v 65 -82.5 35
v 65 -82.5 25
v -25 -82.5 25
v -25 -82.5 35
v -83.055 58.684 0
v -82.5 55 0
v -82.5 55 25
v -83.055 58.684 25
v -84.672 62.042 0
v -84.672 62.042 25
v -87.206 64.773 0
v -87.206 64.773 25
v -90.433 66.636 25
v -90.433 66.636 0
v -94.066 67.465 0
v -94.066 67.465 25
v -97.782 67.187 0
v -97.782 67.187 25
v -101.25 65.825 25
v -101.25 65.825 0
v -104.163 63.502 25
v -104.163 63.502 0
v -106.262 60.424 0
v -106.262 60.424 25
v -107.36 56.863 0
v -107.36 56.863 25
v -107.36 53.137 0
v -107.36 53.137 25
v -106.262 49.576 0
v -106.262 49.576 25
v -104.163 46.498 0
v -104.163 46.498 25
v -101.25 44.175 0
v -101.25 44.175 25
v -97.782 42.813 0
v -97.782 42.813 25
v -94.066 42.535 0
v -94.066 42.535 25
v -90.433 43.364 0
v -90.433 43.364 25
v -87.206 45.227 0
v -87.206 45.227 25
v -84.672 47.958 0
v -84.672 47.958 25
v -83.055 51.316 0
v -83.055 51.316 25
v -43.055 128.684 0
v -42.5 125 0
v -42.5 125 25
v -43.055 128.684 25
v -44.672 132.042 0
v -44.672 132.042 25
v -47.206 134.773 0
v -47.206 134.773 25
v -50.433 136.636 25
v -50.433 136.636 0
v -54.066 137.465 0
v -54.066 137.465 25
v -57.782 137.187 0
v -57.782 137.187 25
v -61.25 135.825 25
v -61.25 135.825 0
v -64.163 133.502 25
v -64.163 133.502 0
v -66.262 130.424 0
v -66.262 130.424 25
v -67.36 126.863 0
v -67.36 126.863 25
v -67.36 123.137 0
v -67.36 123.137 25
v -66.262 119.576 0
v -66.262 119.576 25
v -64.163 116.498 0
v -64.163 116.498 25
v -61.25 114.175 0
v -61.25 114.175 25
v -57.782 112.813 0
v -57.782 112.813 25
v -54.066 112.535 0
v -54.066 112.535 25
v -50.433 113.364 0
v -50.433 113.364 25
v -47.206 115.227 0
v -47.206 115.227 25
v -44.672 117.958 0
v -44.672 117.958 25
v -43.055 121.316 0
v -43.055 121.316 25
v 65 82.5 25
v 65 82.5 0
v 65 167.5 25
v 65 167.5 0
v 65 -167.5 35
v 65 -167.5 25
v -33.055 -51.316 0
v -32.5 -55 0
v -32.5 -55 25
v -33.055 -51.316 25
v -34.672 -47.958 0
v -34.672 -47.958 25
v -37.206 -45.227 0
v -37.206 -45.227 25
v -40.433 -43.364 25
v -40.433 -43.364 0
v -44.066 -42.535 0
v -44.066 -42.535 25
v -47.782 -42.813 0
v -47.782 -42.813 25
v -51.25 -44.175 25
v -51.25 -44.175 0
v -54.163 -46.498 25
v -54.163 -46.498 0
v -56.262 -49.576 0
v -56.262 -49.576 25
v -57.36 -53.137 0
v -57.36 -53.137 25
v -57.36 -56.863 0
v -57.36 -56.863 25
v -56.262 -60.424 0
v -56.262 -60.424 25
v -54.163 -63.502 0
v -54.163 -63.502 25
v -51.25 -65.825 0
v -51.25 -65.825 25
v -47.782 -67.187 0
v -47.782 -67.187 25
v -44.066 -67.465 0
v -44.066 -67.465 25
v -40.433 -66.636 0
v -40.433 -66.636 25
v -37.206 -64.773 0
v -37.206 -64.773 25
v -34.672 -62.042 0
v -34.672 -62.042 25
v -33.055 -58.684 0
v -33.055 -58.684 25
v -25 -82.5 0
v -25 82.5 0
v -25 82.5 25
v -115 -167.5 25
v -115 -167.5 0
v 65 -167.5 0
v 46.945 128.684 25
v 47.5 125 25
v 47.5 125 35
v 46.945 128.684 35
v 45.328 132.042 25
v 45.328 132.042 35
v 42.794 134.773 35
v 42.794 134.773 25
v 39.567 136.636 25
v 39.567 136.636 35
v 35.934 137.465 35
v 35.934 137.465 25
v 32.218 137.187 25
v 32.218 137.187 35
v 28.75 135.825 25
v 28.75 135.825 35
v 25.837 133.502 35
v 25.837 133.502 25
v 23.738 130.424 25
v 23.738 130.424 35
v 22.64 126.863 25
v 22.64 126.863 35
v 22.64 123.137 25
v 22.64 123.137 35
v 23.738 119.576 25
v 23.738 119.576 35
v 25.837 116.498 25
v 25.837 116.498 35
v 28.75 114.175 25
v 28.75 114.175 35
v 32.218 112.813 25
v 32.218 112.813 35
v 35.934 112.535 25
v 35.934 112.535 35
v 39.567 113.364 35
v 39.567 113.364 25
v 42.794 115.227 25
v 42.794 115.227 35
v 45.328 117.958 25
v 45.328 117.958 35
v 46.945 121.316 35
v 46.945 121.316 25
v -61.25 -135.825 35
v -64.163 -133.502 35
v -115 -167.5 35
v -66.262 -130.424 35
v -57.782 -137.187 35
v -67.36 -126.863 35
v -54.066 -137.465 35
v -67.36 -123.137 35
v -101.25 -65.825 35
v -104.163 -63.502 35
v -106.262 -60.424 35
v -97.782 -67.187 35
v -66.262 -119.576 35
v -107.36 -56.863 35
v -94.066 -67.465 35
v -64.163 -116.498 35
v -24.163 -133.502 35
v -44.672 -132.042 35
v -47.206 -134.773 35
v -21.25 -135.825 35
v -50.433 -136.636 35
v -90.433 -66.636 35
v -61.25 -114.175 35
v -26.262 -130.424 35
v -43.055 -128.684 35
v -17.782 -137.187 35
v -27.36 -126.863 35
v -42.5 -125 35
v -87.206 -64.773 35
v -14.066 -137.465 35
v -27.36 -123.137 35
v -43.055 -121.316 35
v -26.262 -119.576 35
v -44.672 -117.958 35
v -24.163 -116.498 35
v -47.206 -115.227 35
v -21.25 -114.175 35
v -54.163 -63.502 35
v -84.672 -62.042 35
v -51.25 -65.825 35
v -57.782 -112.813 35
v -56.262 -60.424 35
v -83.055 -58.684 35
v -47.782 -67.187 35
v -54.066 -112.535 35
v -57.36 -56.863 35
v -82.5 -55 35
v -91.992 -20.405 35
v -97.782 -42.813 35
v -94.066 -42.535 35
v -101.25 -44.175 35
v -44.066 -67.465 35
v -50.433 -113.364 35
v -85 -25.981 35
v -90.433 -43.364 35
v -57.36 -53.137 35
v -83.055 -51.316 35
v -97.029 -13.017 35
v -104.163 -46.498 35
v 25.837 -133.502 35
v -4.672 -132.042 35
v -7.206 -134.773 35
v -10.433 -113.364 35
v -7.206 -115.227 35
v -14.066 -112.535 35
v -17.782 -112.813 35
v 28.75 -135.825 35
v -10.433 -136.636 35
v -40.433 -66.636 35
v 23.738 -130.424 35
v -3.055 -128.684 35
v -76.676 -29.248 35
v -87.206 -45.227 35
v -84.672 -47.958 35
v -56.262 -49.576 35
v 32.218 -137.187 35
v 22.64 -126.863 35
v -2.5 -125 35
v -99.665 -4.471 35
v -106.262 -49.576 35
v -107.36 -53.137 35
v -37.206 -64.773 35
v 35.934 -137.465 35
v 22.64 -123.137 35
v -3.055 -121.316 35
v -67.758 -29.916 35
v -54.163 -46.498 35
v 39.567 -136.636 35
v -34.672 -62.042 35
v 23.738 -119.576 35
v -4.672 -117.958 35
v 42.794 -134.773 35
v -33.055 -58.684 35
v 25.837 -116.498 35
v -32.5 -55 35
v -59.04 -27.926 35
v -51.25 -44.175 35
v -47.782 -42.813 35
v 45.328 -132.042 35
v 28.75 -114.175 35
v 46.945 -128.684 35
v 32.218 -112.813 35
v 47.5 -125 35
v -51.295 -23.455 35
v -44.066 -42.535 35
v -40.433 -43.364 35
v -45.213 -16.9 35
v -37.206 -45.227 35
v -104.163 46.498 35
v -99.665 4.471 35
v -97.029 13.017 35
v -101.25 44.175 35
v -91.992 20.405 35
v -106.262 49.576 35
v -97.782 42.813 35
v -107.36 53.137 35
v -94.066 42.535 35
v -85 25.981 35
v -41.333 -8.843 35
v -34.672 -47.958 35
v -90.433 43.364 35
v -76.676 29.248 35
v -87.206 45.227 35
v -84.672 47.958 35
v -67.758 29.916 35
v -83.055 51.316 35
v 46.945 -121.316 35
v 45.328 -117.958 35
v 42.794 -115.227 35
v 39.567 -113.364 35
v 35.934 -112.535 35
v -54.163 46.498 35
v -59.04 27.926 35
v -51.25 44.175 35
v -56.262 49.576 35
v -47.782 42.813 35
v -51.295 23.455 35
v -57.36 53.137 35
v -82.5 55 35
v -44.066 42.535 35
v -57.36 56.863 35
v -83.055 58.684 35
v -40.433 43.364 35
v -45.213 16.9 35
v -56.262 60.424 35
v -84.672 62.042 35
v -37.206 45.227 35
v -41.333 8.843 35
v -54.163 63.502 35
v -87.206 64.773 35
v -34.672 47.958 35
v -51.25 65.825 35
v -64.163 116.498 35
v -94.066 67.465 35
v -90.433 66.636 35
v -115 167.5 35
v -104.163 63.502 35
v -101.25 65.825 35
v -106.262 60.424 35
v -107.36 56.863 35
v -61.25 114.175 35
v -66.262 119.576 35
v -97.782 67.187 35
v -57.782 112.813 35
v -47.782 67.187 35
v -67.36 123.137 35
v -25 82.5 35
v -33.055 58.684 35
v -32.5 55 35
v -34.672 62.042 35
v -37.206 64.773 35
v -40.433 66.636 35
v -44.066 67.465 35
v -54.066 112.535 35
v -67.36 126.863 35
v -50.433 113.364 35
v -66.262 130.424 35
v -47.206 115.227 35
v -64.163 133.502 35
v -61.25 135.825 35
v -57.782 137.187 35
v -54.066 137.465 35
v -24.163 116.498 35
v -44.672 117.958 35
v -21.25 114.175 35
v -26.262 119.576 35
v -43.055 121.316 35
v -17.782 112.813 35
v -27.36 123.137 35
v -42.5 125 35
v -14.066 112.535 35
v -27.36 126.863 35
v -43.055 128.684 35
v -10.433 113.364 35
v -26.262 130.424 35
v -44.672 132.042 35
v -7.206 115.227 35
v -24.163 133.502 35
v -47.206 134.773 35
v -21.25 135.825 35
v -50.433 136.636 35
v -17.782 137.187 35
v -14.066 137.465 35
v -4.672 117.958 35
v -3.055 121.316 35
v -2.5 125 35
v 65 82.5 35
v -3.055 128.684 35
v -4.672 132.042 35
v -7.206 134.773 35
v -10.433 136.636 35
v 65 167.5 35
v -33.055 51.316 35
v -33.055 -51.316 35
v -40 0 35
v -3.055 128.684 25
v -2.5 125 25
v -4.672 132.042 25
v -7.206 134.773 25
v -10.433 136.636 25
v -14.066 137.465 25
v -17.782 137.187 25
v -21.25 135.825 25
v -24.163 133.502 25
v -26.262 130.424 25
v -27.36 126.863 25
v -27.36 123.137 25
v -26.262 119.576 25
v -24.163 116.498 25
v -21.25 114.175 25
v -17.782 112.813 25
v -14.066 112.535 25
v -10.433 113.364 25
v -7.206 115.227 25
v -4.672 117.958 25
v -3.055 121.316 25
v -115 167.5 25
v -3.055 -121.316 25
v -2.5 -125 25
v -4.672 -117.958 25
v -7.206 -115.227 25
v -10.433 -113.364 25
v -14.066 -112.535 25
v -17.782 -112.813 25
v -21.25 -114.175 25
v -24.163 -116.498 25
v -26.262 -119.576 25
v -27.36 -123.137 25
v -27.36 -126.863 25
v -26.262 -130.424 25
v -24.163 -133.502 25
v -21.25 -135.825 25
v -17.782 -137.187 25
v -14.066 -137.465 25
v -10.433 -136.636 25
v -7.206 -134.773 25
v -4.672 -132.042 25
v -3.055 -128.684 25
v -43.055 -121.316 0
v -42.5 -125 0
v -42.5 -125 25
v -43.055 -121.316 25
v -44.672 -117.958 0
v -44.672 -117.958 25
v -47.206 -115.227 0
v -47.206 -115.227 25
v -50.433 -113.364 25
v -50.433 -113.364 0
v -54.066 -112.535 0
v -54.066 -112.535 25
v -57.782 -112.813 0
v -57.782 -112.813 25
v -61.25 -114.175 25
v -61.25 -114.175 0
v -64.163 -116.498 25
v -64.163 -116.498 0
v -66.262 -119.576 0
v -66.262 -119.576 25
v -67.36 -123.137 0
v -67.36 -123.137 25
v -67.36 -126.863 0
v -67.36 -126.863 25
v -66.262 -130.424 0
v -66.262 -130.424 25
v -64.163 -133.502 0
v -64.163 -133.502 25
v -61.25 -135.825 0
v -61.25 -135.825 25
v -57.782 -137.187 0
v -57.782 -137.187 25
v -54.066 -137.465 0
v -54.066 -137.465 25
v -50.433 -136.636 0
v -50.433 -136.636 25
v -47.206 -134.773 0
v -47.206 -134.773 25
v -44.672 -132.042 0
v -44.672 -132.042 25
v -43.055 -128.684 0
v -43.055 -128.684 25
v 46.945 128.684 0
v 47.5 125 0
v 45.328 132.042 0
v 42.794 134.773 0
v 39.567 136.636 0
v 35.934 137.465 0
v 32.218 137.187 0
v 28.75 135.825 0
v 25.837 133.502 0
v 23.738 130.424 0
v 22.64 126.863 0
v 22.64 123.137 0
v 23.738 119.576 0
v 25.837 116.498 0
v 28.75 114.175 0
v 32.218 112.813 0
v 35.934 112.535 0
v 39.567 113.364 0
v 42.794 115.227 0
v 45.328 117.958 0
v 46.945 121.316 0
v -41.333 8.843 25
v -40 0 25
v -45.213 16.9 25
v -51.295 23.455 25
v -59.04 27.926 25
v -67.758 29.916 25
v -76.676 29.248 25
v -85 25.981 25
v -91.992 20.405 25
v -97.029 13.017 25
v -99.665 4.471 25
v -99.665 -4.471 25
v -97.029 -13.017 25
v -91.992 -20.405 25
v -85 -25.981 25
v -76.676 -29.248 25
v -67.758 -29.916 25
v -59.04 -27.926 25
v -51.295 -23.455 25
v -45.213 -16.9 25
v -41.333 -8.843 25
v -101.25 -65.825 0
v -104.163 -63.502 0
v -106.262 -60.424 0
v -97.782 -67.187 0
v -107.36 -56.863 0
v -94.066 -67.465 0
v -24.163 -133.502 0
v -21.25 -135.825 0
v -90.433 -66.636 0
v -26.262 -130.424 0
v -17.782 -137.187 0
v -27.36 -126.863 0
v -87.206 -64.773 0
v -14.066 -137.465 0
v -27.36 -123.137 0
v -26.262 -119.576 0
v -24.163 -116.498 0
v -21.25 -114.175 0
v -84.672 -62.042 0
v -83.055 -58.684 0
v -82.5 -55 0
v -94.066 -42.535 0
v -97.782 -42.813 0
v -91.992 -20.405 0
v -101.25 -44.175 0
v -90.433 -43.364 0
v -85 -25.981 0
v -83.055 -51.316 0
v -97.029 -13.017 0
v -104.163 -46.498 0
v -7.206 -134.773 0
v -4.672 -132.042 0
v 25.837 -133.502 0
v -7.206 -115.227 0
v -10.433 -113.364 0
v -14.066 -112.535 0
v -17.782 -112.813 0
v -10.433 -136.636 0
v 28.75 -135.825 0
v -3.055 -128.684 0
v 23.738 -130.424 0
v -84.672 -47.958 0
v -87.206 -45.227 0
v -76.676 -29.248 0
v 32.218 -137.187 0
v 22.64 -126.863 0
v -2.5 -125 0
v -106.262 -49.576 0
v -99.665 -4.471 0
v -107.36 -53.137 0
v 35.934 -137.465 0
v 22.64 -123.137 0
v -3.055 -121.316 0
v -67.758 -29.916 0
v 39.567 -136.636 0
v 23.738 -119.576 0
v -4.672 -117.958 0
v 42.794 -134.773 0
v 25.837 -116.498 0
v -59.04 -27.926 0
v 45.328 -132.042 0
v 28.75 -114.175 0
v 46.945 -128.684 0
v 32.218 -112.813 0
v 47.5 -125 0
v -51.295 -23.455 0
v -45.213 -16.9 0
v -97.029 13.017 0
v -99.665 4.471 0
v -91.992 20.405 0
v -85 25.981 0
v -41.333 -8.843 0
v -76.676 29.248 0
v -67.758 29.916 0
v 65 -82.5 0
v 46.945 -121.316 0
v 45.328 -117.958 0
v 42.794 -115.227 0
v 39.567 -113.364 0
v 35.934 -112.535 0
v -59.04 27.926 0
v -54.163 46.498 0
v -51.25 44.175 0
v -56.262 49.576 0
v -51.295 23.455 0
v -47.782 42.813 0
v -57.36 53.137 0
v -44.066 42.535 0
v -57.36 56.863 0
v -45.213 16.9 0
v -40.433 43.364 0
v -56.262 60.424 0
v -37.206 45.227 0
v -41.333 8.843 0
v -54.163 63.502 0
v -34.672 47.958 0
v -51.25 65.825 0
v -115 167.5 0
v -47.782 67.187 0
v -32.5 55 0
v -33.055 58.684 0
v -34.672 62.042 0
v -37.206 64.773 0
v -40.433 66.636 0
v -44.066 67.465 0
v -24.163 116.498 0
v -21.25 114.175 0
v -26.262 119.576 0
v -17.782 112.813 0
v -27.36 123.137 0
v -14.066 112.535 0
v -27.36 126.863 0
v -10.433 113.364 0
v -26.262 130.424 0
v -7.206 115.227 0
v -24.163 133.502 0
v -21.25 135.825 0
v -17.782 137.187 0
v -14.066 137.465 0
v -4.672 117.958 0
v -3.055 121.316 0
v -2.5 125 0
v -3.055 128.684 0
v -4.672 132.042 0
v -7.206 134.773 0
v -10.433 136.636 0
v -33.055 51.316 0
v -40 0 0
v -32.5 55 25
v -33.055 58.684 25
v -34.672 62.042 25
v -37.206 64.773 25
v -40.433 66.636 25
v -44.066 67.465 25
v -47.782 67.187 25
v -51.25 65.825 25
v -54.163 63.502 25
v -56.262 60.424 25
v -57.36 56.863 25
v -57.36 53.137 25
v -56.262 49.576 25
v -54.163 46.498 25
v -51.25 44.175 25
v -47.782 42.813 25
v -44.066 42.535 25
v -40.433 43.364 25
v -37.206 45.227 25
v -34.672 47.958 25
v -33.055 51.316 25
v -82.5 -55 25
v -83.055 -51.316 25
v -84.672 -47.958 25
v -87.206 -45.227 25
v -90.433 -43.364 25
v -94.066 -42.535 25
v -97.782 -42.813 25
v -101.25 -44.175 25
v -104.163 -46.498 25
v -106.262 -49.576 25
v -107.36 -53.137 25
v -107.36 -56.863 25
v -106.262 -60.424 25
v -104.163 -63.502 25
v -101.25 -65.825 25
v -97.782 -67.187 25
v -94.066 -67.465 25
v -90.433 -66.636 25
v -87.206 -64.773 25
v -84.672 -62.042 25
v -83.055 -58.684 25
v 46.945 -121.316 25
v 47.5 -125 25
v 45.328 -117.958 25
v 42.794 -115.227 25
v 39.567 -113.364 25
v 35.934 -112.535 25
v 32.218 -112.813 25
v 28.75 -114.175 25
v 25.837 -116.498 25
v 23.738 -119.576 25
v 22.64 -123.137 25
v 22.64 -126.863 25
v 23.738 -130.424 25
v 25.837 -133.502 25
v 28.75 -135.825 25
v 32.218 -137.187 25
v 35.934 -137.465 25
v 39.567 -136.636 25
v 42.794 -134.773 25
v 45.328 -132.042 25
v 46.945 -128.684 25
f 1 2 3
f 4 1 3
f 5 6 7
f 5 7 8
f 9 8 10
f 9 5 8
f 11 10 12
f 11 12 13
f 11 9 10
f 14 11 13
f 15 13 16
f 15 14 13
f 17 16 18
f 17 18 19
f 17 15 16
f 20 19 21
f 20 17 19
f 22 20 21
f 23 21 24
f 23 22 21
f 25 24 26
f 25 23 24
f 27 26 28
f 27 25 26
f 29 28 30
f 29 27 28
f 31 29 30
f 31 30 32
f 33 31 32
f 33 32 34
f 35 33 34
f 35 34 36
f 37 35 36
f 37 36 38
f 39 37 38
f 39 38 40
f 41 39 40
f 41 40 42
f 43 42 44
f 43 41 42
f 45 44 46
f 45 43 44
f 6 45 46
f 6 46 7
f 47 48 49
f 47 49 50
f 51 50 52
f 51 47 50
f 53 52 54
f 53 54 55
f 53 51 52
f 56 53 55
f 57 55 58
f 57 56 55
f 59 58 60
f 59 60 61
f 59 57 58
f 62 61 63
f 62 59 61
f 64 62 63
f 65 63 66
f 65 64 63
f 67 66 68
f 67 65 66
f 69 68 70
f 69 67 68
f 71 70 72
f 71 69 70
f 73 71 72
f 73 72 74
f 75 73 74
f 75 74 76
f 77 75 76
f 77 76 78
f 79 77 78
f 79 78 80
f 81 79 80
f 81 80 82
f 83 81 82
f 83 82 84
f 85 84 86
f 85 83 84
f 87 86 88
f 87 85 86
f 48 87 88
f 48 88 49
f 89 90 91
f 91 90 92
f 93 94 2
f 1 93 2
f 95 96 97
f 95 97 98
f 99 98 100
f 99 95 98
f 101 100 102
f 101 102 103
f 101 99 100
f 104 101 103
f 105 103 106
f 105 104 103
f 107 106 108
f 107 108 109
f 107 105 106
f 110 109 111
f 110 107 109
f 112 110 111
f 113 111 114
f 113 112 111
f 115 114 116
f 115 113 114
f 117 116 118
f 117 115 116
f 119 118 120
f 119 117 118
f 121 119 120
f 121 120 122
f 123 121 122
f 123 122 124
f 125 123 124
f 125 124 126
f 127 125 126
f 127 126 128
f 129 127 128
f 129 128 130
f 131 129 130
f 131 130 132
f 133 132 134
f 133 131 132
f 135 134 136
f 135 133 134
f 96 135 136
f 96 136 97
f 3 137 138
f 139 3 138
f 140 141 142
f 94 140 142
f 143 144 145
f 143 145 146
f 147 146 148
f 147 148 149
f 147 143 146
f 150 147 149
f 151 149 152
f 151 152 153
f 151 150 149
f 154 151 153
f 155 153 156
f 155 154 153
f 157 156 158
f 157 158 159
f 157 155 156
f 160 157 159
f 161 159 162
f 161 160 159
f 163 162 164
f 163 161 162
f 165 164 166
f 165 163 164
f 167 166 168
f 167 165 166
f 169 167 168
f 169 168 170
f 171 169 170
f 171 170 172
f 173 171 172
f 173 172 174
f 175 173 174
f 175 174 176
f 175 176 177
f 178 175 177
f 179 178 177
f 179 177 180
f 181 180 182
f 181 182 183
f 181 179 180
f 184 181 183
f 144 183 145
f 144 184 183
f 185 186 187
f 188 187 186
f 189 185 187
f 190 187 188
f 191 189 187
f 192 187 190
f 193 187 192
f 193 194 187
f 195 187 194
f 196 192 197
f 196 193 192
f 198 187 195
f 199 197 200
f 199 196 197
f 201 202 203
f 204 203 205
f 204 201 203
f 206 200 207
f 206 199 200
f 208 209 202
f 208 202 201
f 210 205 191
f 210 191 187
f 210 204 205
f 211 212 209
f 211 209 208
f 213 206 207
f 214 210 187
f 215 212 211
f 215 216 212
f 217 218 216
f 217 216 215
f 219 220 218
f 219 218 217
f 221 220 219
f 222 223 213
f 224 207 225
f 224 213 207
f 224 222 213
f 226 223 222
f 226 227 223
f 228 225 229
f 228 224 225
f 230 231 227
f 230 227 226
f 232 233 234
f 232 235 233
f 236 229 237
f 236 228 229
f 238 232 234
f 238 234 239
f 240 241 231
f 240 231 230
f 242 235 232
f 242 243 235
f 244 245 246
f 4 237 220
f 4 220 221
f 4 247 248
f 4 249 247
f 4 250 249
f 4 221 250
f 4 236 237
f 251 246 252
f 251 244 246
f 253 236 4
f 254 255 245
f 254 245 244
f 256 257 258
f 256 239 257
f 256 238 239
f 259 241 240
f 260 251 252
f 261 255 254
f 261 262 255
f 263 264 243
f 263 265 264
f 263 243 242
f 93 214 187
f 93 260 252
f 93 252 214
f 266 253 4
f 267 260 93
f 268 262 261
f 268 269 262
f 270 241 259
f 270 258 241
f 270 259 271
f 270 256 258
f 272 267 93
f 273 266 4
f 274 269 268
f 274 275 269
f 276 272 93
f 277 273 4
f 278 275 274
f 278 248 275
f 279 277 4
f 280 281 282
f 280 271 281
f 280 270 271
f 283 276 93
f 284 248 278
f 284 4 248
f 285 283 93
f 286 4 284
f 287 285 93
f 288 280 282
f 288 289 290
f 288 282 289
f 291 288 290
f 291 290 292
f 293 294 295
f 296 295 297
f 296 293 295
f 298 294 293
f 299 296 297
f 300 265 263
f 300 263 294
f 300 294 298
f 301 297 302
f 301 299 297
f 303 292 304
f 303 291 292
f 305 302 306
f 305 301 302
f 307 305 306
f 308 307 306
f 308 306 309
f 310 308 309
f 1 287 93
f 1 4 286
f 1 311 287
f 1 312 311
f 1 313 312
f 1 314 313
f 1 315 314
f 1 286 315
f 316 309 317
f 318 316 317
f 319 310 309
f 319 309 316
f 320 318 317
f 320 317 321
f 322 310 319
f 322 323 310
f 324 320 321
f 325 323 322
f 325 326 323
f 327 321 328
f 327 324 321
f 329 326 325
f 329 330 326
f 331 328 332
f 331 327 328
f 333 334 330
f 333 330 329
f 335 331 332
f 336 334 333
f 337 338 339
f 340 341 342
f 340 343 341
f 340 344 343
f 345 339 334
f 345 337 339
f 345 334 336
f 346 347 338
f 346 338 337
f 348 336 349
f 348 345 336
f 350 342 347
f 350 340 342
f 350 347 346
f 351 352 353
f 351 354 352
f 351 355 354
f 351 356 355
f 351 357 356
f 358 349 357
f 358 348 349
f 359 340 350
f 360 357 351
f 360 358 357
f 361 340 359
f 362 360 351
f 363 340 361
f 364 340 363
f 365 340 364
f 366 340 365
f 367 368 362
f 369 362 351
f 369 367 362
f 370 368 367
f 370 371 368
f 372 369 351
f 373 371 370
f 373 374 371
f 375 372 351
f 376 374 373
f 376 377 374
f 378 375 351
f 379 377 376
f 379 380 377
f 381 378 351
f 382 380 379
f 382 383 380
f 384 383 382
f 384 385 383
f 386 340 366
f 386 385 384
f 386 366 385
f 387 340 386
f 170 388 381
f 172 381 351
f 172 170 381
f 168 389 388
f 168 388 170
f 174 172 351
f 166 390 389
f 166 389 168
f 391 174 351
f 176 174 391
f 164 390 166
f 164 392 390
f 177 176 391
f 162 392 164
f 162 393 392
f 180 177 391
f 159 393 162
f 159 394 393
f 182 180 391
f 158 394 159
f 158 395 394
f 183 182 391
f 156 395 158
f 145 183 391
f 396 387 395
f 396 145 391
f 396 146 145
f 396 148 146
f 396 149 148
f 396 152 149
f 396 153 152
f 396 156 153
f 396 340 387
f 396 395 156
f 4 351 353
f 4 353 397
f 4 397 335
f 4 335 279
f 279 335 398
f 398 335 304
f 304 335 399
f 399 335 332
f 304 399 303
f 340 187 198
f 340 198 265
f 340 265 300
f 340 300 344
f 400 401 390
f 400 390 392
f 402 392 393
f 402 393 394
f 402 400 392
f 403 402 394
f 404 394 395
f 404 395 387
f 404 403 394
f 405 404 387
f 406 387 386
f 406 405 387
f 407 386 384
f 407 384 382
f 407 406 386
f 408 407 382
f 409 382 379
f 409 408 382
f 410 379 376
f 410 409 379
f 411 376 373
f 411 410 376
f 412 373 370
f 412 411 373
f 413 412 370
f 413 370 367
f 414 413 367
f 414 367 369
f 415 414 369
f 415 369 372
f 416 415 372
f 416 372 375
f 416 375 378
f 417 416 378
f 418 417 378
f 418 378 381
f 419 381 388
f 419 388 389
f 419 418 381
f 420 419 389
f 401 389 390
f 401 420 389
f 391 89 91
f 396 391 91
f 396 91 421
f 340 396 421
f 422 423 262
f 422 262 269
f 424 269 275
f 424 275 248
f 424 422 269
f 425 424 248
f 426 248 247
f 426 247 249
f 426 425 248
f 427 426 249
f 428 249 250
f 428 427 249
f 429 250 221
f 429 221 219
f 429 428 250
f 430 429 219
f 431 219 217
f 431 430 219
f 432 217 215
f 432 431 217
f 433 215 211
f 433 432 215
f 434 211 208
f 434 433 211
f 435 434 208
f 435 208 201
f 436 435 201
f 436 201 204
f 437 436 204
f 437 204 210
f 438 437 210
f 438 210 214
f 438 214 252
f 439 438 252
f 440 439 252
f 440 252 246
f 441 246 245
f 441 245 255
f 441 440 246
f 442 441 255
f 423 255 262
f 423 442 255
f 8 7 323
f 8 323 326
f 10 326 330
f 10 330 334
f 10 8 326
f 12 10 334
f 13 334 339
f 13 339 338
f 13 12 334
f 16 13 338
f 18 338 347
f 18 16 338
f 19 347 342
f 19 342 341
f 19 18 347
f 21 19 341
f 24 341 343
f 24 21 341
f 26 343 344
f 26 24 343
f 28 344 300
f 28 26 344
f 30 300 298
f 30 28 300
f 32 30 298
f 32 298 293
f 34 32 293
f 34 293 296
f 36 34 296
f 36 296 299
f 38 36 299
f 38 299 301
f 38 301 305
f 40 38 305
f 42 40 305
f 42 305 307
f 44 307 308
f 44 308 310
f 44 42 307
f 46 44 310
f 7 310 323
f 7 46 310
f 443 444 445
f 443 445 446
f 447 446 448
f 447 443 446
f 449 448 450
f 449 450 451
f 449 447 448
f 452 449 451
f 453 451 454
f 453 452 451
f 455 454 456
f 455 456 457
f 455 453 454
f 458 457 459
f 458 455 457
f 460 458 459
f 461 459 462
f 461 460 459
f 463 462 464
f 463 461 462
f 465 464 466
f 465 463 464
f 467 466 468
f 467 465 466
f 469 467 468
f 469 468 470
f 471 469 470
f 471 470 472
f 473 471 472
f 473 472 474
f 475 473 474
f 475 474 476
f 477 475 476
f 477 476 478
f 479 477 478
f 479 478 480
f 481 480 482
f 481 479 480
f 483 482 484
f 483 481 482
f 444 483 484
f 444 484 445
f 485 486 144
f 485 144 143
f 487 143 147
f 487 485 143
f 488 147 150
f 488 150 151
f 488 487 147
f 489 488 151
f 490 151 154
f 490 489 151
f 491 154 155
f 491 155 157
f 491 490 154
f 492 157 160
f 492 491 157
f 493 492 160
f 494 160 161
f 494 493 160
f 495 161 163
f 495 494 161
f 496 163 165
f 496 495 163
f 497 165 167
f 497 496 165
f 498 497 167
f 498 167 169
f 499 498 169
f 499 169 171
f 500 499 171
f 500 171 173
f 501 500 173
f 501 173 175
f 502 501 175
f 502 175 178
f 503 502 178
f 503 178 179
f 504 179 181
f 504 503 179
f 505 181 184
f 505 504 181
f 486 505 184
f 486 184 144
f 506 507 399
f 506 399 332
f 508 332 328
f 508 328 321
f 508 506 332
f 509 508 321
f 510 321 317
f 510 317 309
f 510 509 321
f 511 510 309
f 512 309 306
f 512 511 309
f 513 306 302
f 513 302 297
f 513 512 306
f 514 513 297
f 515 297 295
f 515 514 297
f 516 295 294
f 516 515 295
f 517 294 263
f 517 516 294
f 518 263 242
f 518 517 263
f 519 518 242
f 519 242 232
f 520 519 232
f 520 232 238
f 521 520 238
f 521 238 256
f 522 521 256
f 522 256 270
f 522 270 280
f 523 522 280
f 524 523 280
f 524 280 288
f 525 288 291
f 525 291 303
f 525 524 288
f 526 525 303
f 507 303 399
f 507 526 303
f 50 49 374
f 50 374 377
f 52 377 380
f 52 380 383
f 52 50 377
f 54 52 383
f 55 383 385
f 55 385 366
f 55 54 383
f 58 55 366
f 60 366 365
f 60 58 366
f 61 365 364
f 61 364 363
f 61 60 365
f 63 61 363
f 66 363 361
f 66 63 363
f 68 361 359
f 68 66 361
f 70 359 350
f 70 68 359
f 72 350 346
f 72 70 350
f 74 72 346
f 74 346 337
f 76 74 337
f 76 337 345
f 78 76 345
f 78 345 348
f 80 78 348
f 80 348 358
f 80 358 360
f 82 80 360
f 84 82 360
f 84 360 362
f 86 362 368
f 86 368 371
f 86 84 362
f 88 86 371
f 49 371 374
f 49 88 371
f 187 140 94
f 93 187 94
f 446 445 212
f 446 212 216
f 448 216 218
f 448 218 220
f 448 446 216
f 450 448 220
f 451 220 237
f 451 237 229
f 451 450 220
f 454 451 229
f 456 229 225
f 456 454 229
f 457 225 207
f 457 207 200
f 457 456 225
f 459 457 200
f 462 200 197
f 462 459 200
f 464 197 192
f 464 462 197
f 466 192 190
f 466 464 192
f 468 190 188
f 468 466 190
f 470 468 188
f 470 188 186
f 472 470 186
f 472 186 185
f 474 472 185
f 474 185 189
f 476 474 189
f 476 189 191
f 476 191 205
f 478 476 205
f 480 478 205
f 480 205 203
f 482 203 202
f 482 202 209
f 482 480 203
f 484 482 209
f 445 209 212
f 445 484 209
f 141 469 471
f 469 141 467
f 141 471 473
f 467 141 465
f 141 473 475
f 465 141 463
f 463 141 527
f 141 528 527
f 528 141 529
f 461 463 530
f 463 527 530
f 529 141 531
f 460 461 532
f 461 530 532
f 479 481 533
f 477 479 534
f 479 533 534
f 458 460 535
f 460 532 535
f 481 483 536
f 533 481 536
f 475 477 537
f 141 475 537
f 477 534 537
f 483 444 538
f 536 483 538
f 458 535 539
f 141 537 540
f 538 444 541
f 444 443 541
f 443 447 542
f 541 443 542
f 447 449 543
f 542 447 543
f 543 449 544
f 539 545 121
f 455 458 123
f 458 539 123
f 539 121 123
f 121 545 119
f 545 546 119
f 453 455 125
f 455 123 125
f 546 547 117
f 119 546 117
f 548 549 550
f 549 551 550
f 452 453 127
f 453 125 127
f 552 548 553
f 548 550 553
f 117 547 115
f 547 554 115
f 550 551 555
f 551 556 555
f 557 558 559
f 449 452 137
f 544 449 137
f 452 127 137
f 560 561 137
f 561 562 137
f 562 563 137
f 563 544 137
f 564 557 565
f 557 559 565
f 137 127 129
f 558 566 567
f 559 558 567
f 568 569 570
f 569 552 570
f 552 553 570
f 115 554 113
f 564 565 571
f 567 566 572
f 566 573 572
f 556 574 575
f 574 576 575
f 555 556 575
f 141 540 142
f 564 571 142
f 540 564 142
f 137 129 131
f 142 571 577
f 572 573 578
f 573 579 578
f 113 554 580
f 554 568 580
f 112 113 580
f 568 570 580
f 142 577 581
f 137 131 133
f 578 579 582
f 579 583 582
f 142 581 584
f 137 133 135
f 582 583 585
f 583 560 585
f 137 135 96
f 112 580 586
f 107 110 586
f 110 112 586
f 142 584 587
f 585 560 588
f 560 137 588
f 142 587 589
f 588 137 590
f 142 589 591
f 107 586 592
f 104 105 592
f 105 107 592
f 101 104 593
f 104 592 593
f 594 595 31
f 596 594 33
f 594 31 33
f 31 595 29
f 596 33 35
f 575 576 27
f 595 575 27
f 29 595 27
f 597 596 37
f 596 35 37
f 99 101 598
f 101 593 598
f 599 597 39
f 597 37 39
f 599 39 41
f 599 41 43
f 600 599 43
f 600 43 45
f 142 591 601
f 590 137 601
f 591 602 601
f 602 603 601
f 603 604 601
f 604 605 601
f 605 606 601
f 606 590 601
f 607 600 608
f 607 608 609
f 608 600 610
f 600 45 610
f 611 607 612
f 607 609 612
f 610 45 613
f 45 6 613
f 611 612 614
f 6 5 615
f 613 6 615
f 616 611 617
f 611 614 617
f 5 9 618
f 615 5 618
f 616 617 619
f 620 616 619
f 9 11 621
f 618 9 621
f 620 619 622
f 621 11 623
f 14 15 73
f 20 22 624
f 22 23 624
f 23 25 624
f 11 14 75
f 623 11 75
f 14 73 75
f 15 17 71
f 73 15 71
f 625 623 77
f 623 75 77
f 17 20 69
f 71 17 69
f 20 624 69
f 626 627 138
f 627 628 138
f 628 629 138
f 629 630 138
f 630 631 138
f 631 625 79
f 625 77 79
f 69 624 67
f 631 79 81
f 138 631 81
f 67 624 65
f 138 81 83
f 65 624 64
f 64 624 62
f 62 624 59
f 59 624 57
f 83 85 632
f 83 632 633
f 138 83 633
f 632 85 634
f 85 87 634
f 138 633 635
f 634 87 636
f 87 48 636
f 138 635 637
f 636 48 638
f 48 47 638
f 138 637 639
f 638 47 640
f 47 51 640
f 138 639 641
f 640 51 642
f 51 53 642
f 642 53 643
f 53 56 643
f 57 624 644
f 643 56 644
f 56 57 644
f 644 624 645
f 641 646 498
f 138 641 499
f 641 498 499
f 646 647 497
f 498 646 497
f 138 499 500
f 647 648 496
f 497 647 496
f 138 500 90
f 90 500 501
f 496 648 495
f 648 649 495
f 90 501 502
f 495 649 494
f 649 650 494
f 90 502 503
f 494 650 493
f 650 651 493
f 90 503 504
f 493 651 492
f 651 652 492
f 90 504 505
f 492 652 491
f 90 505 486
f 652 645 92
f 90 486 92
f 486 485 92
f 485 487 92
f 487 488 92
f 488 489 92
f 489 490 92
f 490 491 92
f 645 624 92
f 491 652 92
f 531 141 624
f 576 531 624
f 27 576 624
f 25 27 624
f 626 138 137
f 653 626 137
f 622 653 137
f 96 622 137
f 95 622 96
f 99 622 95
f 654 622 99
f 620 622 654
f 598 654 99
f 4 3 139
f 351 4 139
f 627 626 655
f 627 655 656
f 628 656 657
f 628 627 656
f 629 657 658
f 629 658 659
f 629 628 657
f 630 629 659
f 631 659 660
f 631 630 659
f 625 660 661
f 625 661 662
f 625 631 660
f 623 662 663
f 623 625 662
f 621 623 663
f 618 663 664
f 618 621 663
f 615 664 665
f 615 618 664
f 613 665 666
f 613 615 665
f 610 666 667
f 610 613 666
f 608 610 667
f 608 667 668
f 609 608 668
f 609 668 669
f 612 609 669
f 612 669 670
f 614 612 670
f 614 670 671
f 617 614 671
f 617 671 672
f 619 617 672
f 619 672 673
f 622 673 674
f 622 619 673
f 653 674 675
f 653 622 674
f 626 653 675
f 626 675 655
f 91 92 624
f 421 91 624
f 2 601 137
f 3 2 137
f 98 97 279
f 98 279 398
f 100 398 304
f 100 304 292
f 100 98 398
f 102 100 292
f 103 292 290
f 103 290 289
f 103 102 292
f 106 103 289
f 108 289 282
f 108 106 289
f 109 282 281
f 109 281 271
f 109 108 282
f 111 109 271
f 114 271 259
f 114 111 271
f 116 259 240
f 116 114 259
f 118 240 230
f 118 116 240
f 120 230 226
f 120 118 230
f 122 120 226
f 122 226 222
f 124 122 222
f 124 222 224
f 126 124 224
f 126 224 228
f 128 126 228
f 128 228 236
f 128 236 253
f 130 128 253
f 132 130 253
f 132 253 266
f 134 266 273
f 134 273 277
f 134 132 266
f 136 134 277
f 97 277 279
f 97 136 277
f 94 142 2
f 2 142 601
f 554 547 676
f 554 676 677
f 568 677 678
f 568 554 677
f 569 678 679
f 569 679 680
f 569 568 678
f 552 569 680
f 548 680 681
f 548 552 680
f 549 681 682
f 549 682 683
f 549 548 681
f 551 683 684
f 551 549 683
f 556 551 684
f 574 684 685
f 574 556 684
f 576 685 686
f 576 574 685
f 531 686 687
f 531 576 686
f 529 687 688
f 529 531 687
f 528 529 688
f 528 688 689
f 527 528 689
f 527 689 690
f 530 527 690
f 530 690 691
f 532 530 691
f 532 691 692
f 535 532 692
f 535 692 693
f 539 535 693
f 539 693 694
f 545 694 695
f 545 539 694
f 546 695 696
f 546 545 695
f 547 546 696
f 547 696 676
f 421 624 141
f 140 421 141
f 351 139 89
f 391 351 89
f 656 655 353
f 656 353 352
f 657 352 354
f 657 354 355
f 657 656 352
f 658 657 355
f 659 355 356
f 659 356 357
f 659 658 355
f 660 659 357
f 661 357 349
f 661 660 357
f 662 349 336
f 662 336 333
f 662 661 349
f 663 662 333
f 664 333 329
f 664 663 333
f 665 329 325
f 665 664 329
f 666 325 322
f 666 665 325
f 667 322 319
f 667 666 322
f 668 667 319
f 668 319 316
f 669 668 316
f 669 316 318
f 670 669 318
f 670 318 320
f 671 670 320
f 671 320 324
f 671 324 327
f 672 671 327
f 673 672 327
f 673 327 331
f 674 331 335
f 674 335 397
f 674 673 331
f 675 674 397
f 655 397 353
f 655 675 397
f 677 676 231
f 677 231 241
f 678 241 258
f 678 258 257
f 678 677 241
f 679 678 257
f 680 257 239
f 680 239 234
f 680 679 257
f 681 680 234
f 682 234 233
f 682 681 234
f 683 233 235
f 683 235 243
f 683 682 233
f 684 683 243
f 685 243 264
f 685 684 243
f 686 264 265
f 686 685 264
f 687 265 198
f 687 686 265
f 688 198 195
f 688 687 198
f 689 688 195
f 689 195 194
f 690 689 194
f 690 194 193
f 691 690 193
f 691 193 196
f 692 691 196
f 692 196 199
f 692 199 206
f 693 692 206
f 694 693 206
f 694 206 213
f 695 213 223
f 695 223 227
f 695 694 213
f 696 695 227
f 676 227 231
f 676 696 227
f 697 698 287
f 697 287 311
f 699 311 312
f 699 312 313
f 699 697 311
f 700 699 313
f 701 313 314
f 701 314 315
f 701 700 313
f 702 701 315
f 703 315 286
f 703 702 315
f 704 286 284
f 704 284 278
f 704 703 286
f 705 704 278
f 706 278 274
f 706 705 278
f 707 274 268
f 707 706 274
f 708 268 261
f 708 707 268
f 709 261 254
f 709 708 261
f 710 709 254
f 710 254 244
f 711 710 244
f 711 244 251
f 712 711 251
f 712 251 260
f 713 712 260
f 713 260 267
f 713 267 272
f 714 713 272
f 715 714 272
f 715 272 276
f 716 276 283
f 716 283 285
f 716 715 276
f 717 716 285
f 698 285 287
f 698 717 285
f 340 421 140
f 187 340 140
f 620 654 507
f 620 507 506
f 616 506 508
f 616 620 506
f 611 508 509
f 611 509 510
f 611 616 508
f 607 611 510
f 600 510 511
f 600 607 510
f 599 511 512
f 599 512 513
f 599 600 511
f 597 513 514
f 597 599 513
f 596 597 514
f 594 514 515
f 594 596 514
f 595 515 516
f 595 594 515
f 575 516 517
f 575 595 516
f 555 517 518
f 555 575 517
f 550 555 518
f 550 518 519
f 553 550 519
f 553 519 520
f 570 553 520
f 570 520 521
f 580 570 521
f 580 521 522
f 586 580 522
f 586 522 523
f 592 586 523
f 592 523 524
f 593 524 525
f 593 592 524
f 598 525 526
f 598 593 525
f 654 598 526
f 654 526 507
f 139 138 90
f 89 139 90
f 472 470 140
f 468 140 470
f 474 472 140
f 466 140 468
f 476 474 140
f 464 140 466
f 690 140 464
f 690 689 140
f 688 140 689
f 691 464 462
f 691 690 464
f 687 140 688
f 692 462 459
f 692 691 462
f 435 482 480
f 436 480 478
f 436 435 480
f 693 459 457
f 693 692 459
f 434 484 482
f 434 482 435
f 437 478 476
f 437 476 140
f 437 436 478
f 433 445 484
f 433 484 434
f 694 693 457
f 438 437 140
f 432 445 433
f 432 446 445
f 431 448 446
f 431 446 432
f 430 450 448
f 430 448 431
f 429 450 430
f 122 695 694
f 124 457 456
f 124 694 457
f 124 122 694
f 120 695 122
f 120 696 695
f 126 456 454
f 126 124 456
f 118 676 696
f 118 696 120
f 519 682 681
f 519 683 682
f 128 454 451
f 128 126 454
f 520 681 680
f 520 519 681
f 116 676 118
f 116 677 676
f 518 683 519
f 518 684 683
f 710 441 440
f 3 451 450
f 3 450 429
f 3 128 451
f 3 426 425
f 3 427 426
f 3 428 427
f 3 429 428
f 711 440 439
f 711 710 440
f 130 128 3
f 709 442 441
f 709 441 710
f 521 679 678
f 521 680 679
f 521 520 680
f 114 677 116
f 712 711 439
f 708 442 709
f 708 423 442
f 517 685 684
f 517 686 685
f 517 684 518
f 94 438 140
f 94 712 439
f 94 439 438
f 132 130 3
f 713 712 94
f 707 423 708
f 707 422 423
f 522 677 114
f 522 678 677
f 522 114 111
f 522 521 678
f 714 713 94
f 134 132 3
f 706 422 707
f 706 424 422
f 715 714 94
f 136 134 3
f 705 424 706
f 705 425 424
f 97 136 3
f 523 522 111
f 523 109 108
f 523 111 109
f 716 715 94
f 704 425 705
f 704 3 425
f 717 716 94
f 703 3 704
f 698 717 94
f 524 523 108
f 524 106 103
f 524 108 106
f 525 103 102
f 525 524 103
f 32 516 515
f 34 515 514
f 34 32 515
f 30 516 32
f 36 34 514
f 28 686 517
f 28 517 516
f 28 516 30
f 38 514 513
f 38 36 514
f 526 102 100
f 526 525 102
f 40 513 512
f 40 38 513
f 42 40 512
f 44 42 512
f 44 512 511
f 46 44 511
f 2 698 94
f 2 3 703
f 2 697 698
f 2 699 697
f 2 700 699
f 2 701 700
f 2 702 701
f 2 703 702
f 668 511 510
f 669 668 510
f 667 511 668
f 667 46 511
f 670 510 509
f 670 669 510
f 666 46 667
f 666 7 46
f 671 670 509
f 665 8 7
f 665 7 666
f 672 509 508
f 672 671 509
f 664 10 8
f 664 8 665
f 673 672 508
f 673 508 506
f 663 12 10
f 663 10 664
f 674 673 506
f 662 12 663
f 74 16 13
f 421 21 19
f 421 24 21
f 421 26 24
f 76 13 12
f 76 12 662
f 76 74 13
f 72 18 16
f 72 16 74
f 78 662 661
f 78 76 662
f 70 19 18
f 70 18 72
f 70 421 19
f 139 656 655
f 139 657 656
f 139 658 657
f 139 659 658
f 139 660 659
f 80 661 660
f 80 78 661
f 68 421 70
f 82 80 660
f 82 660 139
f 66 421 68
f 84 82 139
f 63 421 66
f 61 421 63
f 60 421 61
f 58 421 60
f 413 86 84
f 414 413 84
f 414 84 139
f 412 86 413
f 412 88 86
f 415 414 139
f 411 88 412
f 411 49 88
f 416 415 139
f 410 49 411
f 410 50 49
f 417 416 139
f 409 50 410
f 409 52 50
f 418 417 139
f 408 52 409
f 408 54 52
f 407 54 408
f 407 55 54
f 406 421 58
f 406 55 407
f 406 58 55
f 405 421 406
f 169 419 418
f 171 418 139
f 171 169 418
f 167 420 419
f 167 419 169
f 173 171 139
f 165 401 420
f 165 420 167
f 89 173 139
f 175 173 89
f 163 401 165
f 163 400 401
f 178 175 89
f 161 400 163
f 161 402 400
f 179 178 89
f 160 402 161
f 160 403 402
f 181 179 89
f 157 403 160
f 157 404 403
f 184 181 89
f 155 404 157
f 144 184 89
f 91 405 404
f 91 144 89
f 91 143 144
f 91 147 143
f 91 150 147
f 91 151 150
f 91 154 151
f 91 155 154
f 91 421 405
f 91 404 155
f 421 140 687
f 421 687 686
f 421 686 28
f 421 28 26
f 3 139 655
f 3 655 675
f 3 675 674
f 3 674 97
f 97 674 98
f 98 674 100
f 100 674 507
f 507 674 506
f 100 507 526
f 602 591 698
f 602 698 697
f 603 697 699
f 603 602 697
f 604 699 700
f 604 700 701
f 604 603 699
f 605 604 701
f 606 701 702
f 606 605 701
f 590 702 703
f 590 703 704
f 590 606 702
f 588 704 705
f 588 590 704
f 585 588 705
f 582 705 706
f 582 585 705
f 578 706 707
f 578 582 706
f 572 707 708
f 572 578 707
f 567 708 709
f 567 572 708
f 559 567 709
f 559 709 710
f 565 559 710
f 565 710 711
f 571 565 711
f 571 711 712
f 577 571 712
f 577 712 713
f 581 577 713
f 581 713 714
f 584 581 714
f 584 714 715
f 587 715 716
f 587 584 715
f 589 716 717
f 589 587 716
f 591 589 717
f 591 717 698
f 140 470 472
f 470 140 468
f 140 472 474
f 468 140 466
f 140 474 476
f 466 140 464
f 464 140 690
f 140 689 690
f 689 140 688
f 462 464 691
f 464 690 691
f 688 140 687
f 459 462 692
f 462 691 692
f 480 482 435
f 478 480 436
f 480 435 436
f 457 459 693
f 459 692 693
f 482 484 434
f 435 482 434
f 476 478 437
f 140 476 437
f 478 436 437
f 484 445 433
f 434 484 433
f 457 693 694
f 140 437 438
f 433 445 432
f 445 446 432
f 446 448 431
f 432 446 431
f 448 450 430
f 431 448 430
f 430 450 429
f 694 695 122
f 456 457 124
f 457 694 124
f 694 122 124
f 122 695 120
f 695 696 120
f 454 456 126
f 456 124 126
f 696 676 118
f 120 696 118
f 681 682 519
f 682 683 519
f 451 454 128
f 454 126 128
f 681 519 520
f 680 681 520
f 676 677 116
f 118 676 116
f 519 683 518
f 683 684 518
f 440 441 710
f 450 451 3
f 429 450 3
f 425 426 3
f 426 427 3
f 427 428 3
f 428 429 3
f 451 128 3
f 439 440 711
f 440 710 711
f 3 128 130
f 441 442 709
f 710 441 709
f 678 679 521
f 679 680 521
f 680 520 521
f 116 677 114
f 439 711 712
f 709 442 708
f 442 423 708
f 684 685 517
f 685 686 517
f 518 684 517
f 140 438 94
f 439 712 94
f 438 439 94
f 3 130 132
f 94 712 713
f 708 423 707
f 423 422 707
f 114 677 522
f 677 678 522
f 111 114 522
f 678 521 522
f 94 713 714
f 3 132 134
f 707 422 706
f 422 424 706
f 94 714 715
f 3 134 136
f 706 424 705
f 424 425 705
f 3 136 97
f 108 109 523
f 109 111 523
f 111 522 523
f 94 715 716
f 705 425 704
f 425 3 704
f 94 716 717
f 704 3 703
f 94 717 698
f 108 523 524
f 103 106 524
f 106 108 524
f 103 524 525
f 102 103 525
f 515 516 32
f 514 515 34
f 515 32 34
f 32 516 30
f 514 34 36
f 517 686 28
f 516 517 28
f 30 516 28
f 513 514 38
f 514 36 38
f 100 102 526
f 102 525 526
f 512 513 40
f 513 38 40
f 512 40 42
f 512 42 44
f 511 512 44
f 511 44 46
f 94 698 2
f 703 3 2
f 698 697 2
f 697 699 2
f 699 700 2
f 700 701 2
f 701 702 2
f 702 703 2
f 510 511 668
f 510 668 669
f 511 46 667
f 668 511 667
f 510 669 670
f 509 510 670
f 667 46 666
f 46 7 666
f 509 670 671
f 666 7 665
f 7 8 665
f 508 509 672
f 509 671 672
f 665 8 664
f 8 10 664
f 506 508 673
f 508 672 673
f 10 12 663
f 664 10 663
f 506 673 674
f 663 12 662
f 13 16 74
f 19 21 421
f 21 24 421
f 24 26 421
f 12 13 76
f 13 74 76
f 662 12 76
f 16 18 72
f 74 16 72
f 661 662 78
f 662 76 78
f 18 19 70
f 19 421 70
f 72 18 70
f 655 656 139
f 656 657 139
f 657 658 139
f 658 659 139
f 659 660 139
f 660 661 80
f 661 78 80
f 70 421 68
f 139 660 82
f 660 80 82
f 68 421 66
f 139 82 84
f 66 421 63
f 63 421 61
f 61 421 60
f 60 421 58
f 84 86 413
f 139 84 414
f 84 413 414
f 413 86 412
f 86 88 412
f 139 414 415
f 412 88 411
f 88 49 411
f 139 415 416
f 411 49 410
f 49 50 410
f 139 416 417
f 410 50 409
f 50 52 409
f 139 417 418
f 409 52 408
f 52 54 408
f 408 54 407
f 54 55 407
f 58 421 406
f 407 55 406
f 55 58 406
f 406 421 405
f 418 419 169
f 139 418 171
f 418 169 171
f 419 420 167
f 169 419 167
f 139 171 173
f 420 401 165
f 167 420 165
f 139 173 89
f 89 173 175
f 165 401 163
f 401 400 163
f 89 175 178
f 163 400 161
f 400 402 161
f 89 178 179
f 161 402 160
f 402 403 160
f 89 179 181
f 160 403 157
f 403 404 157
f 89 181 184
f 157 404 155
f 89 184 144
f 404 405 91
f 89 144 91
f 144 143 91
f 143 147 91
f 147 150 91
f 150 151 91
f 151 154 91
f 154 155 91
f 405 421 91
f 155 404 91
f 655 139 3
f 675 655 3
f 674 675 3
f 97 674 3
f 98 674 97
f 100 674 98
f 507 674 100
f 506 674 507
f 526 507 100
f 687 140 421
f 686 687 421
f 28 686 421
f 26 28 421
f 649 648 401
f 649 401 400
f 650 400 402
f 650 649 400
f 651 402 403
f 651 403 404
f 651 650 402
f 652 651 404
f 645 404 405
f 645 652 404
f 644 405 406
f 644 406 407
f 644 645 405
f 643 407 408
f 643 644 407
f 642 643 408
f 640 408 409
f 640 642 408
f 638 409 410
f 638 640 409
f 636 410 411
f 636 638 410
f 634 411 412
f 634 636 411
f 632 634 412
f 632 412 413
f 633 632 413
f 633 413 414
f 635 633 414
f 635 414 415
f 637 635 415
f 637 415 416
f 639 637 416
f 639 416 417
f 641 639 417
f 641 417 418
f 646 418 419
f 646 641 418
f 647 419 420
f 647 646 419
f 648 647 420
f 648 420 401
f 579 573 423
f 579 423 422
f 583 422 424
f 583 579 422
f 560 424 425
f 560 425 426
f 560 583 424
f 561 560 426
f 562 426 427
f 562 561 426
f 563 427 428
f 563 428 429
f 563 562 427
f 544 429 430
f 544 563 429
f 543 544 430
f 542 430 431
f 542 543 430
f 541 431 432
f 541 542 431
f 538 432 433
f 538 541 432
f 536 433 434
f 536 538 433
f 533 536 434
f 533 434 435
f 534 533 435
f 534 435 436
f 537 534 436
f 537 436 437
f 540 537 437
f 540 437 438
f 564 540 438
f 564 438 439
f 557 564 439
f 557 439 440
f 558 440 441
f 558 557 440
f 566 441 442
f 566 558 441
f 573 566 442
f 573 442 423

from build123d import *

# Parameters (mm, degrees)
F0_R        = 12.5
F0_R_2      = 30
F1_DEPTH    = 25
F1_FACE_R   = 12.5
F1_FACE_R_2 = 30
F2_DEPTH    = 10


with BuildPart() as f1:
    # F0 (on Top) → F1 (new body)
    with BuildSketch(Plane.XY):
        Polygon((-25, 0), (-25, 82.5), (65, 82.5), (65, 167.5), (-115, 167.5), (-115, -167.5), (65, -167.5), (65, -82.5), (-25, -82.5), align=None)
        with Locations((-55, -125)):
            Circle(F0_R, mode=Mode.SUBTRACT)
        with Locations((-95, -55)):
            Circle(F0_R, mode=Mode.SUBTRACT)
        with Locations((-45, -55)):
            Circle(F0_R, mode=Mode.SUBTRACT)
        with Locations((-15, -125)):
            Circle(F0_R, mode=Mode.SUBTRACT)
        with Locations((35, -125)):
            Circle(F0_R, mode=Mode.SUBTRACT)
        with Locations((-95, 55)):
            Circle(F0_R, mode=Mode.SUBTRACT)
        with Locations((-70, 0)):
            Circle(F0_R_2, mode=Mode.SUBTRACT)
        with Locations((-45, 55)):
            Circle(F0_R, mode=Mode.SUBTRACT)
        with Locations((-55, 125)):
            Circle(F0_R, mode=Mode.SUBTRACT)
        with Locations((-15, 125)):
            Circle(F0_R, mode=Mode.SUBTRACT)
        with Locations((35, 125)):
            Circle(F0_R, mode=Mode.SUBTRACT)
    extrude(amount=F1_DEPTH)


with BuildPart() as f2:
    # F1_face (on face) → F2 (new body)
    with BuildSketch(Plane(origin=(-38.043707, 0, 25), x_dir=(1, 0, 0), z_dir=(0, 0, 1))):
        Polygon((13.043707, -82.5), (13.043707, 82.5), (103.043707, 82.5), (103.043707, 167.5), (-76.956293, 167.5), (-76.956293, -167.5), (103.043707, -167.5), (103.043707, -82.5), align=None)
        with Locations((-16.956293, -125)):
            Circle(F1_FACE_R, mode=Mode.SUBTRACT)
        with Locations((-56.956293, -55)):
            Circle(F1_FACE_R, mode=Mode.SUBTRACT)
        with Locations((-6.956293, -55)):
            Circle(F1_FACE_R, mode=Mode.SUBTRACT)
        with Locations((23.043707, -125)):
            Circle(F1_FACE_R, mode=Mode.SUBTRACT)
        with Locations((73.043707, -125)):
            Circle(F1_FACE_R, mode=Mode.SUBTRACT)
        with Locations((-56.956293, 55)):
            Circle(F1_FACE_R, mode=Mode.SUBTRACT)
        with Locations((-31.956293, 0)):
            Circle(F1_FACE_R_2, mode=Mode.SUBTRACT)
        with Locations((-6.956293, 55)):
            Circle(F1_FACE_R, mode=Mode.SUBTRACT)
        with Locations((-16.956293, 125)):
            Circle(F1_FACE_R, mode=Mode.SUBTRACT)
        with Locations((23.043707, 125)):
            Circle(F1_FACE_R, mode=Mode.SUBTRACT)
        with Locations((73.043707, 125)):
            Circle(F1_FACE_R, mode=Mode.SUBTRACT)
    extrude(amount=F2_DEPTH)


solid = Compound([f1.part, f2.part])
